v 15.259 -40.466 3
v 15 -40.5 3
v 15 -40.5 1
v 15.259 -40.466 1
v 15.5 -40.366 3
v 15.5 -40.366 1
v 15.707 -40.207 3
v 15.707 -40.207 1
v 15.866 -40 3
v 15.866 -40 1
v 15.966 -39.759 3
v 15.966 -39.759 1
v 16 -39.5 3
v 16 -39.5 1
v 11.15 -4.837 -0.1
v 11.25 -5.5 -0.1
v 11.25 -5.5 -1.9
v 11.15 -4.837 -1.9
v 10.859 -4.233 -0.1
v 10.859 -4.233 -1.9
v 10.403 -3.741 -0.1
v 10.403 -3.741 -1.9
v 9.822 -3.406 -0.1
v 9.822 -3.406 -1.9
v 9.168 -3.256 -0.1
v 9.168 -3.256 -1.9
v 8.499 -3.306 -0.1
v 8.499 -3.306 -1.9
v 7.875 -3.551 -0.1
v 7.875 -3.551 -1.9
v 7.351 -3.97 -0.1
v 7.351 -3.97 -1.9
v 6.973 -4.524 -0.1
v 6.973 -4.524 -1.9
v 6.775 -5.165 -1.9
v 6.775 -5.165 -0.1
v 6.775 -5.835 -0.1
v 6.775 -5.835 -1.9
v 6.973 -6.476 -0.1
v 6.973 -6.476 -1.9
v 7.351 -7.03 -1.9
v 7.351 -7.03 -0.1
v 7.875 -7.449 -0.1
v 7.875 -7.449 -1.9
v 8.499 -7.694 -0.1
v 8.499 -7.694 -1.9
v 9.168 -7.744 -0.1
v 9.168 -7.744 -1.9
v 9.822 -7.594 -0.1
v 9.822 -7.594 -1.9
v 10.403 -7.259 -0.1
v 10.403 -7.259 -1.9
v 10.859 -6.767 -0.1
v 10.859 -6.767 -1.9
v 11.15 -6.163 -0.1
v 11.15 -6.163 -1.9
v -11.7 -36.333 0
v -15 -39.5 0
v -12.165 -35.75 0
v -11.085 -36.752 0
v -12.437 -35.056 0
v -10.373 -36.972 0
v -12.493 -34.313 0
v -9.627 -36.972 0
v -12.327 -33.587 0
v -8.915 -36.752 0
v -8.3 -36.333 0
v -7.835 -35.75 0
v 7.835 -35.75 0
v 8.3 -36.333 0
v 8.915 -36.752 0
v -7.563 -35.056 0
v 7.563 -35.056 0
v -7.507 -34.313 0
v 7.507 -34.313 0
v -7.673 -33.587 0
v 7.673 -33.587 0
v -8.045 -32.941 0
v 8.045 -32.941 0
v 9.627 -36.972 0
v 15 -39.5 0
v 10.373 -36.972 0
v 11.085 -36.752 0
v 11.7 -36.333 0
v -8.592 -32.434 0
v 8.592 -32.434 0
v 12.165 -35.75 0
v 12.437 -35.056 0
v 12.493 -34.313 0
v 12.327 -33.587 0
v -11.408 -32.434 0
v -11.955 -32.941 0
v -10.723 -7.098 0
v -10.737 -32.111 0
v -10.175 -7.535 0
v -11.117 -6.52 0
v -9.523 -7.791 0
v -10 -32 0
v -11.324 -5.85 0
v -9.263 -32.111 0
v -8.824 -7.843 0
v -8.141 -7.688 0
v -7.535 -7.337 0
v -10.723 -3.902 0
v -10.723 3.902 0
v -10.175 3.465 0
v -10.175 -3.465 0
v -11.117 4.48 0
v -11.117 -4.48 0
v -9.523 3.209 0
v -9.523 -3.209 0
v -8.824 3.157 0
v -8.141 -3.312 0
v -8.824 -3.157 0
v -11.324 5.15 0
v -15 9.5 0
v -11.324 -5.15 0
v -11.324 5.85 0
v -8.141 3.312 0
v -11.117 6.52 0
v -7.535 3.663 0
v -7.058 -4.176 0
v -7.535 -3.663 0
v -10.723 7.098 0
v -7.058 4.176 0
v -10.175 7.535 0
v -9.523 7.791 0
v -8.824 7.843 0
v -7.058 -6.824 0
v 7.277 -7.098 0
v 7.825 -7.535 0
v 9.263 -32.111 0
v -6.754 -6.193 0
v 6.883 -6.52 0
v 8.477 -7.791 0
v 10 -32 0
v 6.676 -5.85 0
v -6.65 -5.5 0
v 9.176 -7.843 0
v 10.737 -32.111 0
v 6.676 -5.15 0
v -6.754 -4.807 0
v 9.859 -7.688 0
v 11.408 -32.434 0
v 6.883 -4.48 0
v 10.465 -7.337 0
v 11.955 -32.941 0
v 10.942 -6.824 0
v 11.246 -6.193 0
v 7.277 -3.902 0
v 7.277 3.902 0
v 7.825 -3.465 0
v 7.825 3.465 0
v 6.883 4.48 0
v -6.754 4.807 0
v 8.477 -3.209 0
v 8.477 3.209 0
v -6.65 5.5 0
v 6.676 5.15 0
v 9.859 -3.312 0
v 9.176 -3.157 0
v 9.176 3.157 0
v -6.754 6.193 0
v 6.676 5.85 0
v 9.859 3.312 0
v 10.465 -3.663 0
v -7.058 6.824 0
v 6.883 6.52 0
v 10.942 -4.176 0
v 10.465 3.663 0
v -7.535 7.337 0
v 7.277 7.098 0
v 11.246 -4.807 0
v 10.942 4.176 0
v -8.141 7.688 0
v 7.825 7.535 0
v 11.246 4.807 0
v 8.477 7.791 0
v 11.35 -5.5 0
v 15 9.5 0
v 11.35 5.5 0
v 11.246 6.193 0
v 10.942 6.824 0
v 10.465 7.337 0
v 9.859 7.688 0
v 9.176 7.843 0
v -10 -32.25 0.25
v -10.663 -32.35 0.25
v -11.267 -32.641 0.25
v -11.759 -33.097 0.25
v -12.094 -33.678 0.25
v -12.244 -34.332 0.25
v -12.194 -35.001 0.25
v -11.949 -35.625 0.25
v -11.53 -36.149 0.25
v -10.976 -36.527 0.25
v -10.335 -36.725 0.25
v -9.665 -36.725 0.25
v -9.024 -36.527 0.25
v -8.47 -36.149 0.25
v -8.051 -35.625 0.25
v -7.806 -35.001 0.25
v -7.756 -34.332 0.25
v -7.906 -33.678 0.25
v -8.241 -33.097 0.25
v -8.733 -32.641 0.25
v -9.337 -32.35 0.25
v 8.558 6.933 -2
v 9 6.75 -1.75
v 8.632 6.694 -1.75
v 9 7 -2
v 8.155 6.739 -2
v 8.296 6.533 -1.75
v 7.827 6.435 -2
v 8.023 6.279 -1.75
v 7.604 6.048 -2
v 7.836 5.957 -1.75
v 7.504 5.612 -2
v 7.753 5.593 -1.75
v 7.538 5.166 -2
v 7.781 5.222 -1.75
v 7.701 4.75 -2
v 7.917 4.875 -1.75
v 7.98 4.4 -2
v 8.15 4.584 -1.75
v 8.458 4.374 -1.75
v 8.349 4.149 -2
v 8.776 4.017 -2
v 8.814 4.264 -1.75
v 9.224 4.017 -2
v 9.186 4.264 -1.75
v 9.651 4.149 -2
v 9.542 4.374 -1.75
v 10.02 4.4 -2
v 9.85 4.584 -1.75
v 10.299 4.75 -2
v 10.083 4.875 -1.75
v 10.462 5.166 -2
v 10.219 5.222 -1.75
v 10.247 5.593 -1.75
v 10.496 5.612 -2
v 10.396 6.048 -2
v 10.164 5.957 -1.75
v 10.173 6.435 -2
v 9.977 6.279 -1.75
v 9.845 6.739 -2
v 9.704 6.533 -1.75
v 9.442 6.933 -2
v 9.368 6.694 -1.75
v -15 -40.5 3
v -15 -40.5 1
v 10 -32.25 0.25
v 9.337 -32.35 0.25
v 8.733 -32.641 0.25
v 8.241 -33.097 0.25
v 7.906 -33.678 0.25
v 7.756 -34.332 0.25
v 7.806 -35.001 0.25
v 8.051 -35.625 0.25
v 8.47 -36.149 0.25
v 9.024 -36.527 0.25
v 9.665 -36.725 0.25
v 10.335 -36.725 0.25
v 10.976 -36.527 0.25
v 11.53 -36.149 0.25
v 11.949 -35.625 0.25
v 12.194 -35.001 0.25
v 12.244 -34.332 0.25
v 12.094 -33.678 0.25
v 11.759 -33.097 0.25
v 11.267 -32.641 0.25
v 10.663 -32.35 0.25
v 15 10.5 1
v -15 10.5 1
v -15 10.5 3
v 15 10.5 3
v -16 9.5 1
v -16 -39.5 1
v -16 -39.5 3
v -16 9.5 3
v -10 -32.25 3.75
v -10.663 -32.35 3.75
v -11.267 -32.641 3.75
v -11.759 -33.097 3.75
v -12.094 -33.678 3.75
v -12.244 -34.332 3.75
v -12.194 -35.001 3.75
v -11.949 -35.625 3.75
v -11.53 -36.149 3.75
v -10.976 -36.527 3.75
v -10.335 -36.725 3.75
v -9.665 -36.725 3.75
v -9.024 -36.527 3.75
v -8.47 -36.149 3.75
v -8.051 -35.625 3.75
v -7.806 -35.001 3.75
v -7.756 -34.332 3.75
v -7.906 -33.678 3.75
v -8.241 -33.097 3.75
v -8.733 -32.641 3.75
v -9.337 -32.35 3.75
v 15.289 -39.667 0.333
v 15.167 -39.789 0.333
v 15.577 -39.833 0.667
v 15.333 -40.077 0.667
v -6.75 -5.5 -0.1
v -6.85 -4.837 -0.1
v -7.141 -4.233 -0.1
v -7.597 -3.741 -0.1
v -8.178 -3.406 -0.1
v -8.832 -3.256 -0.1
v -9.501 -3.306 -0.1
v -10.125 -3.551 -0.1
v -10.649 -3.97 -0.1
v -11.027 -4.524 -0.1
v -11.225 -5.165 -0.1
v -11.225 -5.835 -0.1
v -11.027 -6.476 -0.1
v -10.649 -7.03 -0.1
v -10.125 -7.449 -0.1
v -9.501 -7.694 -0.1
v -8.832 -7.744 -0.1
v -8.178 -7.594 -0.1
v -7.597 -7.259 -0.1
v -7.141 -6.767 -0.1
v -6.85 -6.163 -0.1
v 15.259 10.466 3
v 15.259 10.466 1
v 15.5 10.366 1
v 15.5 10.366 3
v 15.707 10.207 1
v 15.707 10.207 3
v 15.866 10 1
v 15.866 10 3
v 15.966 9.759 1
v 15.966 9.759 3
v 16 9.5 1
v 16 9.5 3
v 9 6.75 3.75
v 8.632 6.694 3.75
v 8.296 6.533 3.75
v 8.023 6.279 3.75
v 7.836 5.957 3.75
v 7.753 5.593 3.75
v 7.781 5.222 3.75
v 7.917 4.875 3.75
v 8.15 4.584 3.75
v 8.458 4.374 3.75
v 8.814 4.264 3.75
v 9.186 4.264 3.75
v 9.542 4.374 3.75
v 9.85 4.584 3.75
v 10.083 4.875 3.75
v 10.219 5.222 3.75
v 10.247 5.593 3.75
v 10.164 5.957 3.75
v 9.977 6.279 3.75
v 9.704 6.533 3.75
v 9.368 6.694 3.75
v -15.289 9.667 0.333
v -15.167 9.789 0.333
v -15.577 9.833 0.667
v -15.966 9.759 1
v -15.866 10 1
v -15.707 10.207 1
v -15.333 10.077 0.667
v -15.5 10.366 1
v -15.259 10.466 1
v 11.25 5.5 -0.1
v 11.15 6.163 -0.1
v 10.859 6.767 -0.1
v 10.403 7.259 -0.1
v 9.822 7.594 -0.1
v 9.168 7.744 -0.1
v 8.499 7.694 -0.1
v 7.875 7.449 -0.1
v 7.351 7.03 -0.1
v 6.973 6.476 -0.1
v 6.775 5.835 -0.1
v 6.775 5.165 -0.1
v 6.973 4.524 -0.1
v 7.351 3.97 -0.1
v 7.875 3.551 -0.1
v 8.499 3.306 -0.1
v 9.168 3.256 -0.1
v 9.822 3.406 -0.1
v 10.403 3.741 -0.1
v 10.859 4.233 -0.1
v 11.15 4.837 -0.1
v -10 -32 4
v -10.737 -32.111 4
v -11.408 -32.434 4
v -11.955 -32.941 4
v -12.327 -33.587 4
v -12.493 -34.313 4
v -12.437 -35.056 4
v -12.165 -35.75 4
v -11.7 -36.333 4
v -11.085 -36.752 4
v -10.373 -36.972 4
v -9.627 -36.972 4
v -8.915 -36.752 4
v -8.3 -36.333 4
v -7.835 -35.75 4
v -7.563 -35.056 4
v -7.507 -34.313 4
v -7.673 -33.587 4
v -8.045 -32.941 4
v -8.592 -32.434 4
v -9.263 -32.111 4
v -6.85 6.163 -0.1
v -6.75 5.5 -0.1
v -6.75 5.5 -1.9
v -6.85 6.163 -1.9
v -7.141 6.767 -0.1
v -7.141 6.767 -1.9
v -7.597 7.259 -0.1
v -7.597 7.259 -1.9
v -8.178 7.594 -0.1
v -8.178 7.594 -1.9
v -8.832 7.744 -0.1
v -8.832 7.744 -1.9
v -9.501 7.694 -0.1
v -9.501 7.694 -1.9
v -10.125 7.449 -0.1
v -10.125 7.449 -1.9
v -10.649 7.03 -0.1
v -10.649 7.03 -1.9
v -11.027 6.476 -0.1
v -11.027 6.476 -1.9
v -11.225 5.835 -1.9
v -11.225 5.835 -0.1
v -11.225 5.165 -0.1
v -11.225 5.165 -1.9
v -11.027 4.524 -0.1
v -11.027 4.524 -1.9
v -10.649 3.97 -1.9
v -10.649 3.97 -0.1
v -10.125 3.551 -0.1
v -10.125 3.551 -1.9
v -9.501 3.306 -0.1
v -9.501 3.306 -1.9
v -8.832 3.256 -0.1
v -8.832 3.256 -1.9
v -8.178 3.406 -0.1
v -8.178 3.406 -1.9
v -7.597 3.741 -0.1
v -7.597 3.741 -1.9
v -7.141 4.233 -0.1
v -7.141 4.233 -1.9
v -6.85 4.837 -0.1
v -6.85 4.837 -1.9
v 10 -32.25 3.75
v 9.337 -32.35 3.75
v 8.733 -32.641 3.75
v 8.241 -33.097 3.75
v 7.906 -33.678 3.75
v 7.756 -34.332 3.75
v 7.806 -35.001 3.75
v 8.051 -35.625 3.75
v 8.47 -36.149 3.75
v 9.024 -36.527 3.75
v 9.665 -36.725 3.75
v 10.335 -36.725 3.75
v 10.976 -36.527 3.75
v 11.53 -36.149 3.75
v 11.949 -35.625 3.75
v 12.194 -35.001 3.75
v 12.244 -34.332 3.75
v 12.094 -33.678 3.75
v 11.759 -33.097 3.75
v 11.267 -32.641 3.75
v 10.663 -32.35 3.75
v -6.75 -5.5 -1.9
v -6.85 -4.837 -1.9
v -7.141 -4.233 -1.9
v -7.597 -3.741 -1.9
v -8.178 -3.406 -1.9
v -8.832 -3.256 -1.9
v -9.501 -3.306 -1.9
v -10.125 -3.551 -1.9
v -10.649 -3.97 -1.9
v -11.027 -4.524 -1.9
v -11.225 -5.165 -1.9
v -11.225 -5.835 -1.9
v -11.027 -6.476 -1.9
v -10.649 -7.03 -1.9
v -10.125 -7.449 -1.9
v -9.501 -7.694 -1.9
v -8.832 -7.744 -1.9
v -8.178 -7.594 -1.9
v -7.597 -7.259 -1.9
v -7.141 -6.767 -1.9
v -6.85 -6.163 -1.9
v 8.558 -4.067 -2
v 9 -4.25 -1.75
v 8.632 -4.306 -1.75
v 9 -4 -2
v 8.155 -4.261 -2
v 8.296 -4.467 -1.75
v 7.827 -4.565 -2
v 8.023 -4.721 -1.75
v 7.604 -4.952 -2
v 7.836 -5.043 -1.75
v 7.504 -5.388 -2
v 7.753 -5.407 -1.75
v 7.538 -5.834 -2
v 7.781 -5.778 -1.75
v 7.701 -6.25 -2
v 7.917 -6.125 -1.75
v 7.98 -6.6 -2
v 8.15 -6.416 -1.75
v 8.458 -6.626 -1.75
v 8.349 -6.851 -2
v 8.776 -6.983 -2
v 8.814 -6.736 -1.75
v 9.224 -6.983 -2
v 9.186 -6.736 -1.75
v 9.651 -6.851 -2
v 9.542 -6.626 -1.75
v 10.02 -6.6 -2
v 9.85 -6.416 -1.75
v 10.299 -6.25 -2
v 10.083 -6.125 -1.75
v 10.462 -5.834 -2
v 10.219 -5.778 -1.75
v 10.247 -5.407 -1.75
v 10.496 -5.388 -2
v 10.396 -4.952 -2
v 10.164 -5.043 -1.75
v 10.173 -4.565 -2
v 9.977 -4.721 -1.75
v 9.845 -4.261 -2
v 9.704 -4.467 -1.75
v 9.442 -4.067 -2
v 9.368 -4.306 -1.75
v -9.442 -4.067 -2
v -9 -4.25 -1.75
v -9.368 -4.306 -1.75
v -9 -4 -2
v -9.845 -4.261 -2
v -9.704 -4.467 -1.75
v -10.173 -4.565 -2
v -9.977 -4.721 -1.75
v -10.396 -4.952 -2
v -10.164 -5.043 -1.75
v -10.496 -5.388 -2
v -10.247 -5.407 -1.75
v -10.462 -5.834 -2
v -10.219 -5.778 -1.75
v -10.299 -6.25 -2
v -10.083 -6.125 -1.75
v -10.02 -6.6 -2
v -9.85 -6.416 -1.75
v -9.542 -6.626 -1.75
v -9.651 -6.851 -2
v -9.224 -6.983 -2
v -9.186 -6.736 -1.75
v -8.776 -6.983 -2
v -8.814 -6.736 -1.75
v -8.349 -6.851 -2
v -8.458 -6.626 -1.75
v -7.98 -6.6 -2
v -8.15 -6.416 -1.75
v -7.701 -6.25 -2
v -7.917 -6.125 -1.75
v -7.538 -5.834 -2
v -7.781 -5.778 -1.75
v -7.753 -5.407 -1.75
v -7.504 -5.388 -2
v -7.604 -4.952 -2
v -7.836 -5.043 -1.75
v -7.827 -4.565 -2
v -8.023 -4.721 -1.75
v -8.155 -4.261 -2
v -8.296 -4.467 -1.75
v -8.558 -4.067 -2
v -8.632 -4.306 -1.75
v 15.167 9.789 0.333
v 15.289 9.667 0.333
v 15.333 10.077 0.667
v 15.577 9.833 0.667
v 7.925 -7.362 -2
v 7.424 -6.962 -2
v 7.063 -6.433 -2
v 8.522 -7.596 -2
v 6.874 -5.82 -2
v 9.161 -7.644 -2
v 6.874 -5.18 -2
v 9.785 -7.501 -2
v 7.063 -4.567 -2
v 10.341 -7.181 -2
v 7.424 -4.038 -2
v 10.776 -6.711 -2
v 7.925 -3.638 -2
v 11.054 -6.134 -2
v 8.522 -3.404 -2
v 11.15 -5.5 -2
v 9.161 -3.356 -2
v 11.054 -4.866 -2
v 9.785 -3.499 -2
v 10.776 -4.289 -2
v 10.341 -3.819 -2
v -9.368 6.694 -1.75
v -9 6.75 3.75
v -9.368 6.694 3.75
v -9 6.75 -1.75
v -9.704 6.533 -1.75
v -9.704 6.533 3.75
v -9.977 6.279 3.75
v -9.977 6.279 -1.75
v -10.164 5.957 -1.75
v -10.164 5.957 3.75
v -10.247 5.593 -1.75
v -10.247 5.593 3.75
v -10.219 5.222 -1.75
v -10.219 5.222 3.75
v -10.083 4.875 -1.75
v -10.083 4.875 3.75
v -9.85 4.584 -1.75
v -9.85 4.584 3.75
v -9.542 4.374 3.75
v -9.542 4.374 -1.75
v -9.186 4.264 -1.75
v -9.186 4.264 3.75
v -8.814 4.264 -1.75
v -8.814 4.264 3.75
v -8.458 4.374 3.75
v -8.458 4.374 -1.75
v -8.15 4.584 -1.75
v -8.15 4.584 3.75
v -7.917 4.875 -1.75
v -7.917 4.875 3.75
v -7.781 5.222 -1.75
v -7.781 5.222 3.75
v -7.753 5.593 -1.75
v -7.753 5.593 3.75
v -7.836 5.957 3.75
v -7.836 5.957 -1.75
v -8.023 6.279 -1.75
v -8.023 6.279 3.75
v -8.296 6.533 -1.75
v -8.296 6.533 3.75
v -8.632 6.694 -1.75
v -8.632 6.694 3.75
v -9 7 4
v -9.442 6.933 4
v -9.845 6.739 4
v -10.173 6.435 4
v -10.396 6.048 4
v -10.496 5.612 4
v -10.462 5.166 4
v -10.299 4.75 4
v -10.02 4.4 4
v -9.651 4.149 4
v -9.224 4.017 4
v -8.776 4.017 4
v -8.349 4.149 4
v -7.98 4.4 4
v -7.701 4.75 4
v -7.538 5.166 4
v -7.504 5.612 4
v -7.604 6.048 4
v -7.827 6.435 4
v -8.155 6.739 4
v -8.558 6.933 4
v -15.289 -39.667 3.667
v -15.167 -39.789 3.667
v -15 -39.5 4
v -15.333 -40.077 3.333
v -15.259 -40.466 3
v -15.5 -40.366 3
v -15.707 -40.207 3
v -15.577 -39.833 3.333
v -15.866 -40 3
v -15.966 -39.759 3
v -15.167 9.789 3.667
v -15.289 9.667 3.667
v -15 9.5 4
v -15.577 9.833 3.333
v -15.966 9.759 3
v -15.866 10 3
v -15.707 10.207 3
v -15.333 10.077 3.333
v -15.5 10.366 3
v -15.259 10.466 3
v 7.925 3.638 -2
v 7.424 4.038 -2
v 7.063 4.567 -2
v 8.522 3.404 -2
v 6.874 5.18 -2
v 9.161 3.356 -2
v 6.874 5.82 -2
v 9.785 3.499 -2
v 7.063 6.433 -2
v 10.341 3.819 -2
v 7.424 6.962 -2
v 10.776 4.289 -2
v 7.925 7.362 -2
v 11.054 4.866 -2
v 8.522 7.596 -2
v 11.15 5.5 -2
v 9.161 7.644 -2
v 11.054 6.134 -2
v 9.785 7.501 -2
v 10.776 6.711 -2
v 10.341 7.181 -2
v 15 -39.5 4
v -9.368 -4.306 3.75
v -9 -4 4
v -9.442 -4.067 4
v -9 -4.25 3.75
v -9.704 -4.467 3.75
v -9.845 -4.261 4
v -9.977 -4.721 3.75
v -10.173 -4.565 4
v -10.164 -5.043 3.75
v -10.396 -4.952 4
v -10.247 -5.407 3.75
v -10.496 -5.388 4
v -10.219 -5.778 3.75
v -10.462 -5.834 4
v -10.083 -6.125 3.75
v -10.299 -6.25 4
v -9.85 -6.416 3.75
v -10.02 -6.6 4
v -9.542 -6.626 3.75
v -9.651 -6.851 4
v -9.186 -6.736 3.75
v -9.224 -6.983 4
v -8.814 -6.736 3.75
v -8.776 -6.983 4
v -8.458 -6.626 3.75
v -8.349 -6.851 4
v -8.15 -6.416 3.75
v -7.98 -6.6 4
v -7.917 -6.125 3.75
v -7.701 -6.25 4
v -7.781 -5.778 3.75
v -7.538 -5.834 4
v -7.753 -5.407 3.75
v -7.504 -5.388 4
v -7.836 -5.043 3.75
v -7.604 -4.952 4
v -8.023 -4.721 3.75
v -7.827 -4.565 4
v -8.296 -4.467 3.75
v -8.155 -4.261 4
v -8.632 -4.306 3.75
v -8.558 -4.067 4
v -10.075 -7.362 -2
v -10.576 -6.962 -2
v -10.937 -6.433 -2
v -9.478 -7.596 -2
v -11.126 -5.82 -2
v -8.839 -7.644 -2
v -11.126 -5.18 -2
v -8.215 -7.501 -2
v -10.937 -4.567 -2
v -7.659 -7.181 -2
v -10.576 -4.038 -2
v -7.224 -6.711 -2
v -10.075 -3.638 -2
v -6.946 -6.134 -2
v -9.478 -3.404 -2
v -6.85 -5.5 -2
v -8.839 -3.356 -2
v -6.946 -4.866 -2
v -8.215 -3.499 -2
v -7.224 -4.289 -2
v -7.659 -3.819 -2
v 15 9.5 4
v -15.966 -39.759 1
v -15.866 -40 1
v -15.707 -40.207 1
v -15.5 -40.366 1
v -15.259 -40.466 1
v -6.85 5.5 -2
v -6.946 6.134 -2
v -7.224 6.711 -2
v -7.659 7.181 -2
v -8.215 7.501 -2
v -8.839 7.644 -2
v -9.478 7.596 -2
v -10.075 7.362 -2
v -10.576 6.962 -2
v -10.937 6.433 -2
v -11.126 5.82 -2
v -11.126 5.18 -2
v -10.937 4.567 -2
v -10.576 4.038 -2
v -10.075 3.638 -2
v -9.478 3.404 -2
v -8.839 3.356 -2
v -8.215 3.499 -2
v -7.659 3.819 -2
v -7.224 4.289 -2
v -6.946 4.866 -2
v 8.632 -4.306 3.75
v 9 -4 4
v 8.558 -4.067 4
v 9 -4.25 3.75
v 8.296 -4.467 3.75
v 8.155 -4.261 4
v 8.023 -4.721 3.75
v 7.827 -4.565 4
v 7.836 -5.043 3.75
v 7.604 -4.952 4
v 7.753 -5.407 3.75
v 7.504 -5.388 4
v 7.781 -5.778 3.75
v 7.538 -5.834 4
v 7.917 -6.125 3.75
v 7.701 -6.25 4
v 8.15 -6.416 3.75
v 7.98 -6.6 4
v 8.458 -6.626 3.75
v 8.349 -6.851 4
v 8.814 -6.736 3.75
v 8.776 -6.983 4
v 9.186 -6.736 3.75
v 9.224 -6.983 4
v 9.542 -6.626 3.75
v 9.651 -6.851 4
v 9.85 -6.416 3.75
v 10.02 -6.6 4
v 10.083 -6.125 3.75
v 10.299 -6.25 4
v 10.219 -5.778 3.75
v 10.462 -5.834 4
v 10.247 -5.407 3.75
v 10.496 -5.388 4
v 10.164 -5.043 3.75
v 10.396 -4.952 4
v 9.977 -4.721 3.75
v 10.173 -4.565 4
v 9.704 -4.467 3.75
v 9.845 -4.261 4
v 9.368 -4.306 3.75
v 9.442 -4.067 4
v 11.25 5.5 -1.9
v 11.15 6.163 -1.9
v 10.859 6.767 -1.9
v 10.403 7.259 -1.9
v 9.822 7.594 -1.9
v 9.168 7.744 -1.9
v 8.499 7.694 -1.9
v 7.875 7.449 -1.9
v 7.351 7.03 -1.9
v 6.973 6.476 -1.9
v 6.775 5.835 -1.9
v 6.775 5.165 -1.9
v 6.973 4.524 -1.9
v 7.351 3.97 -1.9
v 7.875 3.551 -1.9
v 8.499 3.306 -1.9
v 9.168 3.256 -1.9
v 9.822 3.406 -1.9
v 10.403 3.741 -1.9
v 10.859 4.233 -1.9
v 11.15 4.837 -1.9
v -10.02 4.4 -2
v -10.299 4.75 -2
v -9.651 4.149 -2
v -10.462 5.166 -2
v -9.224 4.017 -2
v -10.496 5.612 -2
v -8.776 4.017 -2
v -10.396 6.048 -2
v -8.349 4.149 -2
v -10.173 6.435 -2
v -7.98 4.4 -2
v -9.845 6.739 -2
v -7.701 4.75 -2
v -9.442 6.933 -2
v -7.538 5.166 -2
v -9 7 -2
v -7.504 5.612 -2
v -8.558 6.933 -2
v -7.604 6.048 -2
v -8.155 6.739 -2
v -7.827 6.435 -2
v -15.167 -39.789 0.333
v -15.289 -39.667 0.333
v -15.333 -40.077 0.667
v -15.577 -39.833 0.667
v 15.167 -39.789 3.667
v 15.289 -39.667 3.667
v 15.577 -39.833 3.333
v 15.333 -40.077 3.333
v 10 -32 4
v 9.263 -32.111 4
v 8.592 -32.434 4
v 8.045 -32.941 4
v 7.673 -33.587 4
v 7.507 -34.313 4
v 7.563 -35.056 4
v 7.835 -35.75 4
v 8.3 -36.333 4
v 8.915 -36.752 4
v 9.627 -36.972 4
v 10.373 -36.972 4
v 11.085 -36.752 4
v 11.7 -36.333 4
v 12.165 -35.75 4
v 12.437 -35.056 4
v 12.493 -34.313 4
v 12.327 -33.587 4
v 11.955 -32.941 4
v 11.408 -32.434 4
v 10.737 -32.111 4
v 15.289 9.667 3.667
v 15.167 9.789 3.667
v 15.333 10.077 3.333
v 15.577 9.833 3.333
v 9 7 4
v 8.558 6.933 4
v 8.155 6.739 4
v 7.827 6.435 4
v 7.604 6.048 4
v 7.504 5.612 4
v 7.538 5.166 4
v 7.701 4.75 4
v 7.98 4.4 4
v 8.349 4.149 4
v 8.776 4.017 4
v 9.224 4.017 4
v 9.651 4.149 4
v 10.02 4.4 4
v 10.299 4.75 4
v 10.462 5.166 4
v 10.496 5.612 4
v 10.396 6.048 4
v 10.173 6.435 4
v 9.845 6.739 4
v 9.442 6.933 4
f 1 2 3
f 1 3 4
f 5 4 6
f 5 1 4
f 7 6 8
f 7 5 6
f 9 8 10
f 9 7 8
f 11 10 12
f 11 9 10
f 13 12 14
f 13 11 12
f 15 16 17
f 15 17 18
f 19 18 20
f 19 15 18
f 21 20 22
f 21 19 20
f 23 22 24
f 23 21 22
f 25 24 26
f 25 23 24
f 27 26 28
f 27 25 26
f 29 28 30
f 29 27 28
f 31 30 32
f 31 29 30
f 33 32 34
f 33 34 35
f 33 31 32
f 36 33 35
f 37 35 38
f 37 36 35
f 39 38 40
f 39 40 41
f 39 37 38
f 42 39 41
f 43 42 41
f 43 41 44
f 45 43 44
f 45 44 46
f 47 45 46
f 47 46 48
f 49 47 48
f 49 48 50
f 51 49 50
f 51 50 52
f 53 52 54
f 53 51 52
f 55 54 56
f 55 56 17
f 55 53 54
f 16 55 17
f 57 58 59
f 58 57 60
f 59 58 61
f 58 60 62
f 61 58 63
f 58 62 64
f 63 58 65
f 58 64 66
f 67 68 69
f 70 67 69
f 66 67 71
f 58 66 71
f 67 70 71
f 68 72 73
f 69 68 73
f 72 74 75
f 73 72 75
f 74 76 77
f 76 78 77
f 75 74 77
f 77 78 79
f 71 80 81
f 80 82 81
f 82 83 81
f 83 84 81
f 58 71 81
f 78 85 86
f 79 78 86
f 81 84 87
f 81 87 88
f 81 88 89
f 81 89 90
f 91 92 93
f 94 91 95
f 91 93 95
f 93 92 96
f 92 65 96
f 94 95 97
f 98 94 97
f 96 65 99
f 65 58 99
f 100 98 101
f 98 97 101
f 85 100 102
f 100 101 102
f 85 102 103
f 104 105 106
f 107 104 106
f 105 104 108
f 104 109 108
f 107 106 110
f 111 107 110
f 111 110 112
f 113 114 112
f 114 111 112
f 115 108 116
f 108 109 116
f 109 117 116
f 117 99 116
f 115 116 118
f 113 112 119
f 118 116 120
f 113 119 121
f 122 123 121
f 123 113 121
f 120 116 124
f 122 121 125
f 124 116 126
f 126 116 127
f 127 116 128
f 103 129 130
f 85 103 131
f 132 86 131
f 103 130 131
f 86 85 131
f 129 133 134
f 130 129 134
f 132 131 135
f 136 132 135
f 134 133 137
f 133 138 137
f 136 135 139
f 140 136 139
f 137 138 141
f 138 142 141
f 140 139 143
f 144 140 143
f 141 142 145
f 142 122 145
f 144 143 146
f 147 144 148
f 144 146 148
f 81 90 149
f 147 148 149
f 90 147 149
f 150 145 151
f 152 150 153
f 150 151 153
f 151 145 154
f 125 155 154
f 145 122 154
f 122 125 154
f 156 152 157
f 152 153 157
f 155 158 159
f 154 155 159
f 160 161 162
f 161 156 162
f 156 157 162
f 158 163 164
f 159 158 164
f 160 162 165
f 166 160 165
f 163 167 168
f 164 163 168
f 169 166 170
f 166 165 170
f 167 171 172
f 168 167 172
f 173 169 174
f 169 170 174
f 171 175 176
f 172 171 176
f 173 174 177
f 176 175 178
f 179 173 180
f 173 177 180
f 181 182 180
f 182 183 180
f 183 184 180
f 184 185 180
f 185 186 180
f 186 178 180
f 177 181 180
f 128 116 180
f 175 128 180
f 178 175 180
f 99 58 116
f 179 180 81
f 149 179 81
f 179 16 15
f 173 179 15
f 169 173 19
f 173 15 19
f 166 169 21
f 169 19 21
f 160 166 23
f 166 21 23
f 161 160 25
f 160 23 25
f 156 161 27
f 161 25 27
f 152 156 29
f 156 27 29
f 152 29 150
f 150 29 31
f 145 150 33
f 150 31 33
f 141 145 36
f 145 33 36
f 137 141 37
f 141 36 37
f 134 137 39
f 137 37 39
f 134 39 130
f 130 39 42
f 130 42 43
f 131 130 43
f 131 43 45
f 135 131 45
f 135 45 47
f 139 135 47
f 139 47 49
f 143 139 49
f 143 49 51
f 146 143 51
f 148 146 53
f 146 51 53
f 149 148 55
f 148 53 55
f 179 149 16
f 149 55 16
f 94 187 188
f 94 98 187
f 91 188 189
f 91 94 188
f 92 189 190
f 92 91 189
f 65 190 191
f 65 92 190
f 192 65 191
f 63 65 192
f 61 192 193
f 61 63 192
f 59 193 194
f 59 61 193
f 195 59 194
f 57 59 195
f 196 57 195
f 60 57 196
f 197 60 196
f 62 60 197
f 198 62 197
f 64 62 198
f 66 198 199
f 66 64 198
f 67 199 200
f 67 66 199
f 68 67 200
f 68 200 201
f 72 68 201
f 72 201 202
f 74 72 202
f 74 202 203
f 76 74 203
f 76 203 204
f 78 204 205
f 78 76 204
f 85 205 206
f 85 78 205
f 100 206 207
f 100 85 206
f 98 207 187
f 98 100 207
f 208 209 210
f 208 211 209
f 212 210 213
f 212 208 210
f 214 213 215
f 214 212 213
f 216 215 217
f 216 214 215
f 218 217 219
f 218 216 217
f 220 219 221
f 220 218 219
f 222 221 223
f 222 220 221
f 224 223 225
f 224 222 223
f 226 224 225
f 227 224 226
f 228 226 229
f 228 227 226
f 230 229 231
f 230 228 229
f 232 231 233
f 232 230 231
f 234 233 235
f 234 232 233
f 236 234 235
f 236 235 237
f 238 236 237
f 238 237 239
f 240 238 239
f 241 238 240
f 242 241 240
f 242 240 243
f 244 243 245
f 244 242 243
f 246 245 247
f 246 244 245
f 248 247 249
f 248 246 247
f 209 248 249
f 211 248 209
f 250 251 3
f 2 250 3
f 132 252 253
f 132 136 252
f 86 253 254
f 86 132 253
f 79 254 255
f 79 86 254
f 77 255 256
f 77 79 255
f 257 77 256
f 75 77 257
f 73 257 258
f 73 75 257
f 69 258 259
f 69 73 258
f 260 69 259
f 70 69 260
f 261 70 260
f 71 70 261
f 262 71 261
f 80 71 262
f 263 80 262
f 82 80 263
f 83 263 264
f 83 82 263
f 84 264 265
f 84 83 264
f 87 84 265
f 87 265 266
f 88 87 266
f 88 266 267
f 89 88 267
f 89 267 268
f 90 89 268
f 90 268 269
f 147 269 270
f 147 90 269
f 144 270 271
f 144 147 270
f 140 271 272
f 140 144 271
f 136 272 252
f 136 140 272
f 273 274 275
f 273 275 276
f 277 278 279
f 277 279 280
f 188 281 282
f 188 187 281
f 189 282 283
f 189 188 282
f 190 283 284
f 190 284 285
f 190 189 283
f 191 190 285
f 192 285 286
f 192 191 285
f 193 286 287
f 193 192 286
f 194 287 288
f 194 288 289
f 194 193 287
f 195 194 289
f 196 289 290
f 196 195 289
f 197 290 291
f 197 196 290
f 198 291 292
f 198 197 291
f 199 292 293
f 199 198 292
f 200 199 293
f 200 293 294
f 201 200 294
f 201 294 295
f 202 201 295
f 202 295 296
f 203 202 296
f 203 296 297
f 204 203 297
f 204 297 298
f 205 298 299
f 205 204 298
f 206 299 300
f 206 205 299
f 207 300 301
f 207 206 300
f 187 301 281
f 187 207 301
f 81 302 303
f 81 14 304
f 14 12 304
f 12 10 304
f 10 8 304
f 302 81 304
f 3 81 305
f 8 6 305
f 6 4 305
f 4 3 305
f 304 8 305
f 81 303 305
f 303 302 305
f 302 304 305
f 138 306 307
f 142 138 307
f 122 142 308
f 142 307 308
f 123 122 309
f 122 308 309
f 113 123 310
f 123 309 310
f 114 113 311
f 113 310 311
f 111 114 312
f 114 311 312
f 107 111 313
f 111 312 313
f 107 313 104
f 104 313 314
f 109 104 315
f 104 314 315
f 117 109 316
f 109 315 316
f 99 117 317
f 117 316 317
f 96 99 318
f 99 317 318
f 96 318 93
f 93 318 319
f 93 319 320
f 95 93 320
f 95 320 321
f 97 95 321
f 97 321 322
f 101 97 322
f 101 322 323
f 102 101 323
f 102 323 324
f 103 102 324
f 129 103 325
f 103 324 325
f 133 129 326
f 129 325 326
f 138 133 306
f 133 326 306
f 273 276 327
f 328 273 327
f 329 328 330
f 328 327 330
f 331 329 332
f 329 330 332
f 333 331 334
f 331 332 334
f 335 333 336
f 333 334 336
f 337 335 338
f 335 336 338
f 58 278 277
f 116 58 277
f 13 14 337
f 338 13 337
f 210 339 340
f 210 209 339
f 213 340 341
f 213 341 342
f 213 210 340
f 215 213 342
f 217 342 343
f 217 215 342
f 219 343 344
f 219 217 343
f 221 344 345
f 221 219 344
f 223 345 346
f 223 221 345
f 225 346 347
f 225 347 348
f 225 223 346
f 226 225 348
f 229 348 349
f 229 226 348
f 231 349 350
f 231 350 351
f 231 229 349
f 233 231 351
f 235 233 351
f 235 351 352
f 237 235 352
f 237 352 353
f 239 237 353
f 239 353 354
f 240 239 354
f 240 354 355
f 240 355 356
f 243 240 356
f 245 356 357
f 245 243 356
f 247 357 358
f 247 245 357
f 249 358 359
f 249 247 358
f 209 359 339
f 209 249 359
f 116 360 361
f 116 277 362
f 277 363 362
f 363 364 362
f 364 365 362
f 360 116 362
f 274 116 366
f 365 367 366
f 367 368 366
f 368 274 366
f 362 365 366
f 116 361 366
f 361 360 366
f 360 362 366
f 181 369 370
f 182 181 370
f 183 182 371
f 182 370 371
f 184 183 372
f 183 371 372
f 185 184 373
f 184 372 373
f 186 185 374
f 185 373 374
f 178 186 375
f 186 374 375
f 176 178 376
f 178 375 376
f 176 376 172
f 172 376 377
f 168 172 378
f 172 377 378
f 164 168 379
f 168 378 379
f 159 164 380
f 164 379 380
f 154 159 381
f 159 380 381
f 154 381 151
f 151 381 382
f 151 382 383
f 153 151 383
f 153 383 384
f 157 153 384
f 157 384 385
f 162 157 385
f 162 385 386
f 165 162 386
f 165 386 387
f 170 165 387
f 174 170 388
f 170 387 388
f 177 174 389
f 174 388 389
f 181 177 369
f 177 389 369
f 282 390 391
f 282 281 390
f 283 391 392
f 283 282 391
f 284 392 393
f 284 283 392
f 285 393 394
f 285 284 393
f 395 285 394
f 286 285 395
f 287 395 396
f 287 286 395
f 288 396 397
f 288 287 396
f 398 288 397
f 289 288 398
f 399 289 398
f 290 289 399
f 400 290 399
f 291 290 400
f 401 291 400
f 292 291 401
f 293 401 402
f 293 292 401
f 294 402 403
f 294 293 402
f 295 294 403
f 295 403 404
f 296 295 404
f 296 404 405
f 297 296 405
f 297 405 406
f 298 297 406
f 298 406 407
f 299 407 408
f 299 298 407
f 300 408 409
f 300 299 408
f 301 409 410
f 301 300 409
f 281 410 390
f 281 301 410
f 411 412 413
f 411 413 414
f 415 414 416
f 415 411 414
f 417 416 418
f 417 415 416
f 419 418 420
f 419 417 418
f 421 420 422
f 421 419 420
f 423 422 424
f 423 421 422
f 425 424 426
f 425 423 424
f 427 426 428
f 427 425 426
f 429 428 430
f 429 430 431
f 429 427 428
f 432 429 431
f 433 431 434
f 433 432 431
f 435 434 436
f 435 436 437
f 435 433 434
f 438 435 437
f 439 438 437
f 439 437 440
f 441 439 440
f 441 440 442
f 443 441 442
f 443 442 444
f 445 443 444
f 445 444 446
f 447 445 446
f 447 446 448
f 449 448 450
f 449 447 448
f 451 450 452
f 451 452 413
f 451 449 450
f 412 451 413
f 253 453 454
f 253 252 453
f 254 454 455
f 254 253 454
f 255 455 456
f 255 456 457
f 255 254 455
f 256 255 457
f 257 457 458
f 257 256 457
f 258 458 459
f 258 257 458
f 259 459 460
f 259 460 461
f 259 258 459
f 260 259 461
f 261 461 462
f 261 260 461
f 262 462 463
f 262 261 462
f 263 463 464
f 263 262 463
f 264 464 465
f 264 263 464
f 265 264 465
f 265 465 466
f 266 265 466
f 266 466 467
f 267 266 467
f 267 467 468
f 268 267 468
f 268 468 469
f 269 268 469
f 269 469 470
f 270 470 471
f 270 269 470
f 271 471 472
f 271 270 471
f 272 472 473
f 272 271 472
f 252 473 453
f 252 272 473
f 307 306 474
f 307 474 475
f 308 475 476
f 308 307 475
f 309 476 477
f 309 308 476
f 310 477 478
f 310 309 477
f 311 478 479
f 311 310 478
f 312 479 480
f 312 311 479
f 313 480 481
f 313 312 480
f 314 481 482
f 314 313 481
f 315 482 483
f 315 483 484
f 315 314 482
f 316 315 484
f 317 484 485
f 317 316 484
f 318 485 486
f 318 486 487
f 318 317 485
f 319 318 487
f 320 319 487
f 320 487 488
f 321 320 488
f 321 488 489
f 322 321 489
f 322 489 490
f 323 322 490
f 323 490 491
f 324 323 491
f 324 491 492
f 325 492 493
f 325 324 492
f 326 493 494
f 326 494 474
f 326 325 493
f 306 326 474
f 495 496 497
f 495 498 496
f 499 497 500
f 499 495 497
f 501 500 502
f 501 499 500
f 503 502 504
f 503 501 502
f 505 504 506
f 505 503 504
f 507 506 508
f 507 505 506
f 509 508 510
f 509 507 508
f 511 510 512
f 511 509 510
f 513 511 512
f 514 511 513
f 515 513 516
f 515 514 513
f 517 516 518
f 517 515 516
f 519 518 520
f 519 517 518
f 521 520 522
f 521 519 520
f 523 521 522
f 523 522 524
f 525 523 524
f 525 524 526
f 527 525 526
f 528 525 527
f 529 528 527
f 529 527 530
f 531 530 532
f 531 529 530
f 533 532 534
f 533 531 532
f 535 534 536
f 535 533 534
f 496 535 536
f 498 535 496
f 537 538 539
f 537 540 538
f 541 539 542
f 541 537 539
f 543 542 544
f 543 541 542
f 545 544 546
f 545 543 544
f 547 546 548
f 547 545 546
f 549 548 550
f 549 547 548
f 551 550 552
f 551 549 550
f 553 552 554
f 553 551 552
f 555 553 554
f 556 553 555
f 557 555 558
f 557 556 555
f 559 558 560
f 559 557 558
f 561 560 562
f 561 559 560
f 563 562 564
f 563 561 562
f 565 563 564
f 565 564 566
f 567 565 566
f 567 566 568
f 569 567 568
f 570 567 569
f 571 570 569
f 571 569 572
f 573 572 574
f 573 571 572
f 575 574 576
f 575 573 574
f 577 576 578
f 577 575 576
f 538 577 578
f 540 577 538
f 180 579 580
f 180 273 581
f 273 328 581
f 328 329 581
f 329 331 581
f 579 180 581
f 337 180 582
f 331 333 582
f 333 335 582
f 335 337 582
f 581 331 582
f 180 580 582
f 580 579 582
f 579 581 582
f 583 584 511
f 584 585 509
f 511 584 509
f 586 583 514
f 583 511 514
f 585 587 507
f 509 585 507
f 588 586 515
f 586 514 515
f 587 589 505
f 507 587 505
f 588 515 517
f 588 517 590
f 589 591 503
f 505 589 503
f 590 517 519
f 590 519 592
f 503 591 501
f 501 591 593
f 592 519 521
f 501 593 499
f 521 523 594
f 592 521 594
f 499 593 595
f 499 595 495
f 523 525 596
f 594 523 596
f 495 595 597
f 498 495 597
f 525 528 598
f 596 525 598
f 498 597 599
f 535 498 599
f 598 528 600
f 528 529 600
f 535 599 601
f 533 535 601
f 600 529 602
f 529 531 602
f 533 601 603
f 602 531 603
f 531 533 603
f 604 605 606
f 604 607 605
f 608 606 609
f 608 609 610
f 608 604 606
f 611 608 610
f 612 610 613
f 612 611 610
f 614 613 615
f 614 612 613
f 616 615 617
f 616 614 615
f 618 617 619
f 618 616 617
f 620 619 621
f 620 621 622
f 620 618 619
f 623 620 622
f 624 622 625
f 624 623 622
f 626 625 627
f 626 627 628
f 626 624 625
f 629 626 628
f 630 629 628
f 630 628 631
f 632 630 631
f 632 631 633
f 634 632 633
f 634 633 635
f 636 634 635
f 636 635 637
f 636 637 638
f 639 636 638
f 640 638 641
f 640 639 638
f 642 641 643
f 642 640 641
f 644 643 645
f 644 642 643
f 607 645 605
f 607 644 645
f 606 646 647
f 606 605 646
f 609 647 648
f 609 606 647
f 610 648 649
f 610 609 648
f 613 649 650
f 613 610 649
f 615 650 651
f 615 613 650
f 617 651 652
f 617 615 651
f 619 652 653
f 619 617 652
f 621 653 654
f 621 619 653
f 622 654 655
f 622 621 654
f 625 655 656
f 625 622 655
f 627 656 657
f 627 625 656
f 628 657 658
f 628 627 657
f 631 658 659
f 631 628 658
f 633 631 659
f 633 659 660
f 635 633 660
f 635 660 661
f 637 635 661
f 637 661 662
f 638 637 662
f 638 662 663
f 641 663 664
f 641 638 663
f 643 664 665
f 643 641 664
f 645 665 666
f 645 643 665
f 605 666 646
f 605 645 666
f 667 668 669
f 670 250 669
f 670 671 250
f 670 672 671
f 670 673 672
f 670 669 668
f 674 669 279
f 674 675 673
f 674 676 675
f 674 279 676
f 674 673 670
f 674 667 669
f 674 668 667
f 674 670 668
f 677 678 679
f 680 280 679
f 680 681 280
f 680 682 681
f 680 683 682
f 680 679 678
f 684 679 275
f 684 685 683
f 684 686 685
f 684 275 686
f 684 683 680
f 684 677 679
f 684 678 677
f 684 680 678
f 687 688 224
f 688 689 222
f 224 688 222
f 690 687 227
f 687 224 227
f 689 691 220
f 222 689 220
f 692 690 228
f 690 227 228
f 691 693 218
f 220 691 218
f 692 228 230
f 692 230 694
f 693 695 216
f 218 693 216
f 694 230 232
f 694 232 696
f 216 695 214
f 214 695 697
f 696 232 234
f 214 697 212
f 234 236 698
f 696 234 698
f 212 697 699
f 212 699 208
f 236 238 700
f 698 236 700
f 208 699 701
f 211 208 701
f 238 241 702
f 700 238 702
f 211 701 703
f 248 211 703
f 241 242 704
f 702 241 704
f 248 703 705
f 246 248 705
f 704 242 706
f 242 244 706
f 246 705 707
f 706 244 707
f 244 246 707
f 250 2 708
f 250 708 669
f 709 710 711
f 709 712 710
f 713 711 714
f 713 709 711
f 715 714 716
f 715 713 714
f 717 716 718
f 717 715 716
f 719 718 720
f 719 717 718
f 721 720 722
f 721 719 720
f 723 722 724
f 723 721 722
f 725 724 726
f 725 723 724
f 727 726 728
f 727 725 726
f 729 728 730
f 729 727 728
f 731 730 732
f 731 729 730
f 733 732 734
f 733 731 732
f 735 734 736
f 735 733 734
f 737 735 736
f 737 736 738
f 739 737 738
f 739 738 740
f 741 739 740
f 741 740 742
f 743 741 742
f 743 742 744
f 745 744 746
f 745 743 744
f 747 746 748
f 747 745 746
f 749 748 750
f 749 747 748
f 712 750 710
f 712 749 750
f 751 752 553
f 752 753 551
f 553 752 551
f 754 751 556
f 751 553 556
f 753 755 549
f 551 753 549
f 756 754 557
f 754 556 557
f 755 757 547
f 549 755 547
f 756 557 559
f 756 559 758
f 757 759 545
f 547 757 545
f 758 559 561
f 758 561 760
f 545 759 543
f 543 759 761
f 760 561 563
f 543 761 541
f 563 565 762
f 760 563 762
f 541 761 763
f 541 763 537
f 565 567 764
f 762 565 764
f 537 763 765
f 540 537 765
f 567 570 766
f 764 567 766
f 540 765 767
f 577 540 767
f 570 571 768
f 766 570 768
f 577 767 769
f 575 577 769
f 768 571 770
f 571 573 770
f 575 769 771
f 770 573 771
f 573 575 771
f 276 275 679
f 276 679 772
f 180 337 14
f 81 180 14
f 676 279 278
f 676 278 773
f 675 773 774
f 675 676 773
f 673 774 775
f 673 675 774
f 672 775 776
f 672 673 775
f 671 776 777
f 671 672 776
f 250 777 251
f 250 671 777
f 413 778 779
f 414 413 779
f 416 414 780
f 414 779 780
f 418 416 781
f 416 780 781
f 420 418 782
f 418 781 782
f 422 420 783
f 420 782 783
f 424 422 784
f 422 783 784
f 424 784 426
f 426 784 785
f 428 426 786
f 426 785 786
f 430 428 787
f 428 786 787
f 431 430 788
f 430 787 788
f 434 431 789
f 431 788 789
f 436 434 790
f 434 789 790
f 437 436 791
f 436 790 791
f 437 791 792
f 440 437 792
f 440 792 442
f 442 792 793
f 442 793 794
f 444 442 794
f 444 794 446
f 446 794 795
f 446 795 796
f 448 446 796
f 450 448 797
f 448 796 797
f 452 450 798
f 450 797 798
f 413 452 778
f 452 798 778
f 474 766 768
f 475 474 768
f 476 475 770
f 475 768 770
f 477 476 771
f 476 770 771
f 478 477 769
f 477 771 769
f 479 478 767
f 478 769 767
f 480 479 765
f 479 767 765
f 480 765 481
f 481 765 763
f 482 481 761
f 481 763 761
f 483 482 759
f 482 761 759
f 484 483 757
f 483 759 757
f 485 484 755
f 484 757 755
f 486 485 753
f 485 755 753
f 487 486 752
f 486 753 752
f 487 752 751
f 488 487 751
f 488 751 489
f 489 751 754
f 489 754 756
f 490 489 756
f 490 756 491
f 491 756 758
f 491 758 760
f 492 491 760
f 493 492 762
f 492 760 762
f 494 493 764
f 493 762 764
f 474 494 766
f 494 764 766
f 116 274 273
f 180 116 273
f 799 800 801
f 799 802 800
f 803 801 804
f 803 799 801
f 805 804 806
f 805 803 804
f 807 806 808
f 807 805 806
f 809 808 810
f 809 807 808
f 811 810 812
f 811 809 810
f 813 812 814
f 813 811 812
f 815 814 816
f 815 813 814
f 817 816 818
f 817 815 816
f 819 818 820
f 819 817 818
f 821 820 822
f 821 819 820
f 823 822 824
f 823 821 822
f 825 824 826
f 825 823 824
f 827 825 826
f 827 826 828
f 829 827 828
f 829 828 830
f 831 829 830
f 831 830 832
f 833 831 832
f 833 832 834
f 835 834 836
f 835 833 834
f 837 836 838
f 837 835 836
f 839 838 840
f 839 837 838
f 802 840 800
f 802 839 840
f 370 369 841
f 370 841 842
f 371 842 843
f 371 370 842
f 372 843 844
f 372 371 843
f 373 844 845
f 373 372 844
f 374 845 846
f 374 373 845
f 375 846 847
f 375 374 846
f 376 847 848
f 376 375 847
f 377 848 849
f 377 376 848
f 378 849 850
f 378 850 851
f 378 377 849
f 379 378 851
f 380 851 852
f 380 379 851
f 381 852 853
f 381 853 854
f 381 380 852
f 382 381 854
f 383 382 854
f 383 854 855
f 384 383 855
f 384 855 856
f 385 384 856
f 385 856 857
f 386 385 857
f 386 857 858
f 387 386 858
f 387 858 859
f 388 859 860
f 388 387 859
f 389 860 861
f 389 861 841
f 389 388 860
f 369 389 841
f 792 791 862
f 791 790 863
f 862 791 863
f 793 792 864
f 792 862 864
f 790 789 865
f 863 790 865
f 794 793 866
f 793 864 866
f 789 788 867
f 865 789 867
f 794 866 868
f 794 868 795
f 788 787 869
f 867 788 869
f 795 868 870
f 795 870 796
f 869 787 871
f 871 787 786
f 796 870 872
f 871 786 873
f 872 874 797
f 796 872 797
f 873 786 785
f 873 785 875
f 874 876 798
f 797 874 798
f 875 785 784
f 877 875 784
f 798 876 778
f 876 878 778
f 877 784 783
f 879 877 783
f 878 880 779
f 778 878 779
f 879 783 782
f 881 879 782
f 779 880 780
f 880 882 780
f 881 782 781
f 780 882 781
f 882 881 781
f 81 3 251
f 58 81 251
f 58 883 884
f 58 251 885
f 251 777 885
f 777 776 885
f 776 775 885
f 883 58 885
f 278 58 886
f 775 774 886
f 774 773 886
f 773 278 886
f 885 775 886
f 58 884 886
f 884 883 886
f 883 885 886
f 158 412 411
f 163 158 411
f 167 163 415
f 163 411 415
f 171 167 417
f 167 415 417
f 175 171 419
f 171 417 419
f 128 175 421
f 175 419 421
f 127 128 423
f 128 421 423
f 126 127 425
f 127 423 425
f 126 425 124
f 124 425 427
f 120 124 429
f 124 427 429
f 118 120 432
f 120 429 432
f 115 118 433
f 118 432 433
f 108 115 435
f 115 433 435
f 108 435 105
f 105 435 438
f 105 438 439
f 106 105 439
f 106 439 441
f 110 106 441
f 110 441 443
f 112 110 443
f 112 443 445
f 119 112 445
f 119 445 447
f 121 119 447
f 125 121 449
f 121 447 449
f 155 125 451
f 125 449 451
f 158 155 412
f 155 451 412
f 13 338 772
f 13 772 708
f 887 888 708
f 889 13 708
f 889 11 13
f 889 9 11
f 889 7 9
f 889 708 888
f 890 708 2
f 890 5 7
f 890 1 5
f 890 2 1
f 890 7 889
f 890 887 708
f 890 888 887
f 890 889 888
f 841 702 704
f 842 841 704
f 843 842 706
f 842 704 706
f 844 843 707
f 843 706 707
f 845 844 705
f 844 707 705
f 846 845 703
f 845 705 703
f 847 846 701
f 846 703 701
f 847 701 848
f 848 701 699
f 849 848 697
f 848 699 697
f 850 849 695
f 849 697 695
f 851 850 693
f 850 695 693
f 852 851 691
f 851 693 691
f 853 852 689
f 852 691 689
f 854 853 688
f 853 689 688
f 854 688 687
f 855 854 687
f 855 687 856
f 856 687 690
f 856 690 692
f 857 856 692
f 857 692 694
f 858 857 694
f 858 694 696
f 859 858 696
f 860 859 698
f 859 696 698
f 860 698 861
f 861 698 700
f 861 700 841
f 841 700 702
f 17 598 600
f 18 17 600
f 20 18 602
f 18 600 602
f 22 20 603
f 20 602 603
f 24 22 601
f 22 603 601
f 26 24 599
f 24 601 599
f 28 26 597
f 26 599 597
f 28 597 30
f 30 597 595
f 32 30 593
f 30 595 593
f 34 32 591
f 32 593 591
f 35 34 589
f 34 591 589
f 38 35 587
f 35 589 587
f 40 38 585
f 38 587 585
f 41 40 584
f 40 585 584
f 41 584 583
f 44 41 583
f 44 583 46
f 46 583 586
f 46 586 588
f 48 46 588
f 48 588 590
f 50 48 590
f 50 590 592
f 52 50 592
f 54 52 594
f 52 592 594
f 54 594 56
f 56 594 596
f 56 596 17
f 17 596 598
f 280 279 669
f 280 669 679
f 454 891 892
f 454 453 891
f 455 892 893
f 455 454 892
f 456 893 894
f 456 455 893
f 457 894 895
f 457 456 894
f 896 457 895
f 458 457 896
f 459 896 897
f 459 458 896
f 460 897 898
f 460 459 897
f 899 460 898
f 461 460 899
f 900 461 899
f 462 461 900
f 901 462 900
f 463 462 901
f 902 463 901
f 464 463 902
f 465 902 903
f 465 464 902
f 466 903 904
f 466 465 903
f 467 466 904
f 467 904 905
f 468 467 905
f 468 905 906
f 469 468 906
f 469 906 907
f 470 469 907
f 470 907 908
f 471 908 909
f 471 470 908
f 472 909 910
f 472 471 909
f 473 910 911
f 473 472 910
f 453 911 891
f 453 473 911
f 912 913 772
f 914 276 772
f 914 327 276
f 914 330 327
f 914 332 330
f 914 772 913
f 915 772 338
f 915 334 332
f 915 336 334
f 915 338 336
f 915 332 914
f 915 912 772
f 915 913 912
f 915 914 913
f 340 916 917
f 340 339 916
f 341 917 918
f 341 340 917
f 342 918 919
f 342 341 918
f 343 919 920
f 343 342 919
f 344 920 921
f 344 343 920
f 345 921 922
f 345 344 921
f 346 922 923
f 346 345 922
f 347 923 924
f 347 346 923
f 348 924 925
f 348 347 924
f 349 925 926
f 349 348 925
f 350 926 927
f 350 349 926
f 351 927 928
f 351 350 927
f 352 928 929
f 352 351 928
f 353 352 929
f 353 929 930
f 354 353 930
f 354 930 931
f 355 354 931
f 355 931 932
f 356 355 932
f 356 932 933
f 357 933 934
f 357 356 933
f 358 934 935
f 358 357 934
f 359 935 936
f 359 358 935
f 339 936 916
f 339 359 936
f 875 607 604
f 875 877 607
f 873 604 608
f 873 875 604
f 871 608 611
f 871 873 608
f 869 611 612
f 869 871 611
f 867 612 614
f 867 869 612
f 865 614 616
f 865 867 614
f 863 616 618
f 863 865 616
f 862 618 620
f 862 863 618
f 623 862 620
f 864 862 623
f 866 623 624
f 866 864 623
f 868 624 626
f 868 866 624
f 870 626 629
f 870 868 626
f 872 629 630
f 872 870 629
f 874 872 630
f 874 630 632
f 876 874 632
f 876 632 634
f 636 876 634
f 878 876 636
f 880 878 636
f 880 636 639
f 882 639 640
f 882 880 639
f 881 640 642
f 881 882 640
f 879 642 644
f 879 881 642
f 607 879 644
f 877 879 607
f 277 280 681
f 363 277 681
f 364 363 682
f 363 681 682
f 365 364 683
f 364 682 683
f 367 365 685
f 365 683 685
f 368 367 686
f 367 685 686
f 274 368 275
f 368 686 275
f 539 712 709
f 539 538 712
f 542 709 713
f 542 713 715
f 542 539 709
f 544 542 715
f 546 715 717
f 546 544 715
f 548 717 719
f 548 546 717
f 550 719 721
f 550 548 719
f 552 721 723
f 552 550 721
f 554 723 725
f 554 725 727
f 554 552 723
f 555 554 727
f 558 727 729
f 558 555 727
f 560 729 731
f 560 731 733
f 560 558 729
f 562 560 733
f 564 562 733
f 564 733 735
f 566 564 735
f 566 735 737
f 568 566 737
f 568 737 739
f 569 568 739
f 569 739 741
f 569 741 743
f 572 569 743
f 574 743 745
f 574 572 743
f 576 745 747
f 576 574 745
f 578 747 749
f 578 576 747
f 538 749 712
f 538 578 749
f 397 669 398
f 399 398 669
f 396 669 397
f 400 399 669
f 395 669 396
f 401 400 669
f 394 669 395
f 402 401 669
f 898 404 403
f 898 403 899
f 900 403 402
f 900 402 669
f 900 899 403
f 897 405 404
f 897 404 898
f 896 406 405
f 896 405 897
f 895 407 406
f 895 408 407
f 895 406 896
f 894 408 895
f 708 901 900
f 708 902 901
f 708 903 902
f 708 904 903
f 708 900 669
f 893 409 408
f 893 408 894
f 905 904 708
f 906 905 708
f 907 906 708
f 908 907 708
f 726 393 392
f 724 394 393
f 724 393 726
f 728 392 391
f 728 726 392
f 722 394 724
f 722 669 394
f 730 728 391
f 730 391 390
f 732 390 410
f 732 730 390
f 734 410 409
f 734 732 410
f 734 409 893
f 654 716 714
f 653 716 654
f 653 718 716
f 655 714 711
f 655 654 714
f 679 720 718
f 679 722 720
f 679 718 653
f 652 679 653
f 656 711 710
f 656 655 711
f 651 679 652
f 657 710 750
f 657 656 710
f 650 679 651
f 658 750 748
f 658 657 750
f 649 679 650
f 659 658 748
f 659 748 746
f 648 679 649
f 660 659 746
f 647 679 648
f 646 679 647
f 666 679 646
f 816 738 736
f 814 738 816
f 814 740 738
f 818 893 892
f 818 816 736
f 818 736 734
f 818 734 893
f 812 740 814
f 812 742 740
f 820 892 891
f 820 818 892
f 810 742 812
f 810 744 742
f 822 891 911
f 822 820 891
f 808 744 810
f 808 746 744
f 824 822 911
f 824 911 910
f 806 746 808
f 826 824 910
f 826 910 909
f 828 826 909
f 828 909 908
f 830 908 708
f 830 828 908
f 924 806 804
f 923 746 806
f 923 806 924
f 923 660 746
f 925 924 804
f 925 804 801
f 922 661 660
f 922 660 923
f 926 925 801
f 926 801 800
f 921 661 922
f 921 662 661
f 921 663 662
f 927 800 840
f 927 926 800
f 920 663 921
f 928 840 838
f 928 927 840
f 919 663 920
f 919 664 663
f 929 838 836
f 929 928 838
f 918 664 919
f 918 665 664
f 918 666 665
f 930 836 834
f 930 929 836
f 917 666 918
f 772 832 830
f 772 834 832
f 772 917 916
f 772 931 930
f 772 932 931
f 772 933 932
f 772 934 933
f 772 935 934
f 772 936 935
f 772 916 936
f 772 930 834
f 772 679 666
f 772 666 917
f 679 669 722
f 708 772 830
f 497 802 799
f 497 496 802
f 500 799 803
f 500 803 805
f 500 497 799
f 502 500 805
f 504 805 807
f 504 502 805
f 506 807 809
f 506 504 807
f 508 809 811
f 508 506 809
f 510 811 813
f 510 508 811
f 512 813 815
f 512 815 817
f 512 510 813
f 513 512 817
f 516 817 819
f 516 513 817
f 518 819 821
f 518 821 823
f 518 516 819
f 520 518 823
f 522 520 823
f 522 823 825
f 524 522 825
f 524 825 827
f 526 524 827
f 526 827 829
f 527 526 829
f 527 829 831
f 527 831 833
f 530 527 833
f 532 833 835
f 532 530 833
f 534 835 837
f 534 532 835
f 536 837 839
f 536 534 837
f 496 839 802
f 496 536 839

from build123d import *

# Parameters (mm, degrees)
SKETCH1_W                      = 32
SKETCH1_H                      = 51
BOSS_EXTRUDE1_DEPTH            = 4
SKETCH1_3_R                    = 2.25
BOSS_EXTRUDE2_DEPTH            = 2
F_2_5MM_DOWEL_HOLE1_AT_2_COUNT = 2
F_2_5MM_DOWEL_HOLE1_AT_2_PITCH = 11
F_2_5MM_DOWEL_HOLE1_AT_3_COUNT = 2
F_2_5MM_DOWEL_HOLE1_AT_3_PITCH = 21.09502311
F_2_5MM_DOWEL_HOLE1_AT_4_COUNT = 2
F_2_5MM_DOWEL_HOLE1_AT_4_PITCH = 18
M4_CLEARANCE_HOLE1_AT_2_COUNT  = 2
M4_CLEARANCE_HOLE1_AT_2_PITCH  = 20
FILLET1_R                      = 1
CHAMFER1_SIZE                  = 1
CHAMFER2_SIZE                  = 0.1


with BuildPart() as part:
    # Sketch1 → Boss-Extrude1 (new body)
    with BuildSketch(Plane.XY):
        with Locations((0, -15)):
            Rectangle(SKETCH1_W, SKETCH1_H)
    extrude(amount=BOSS_EXTRUDE1_DEPTH)

    # Sketch1<3> → Boss-Extrude2 (add)
    with BuildSketch(Plane.XY):
        with Locations((-9, 5.5)):
            Circle(SKETCH1_3_R)
        with Locations((-9, -5.5)):
            Circle(SKETCH1_3_R)
        with Locations((9, -5.5)):
            Circle(SKETCH1_3_R)
        with Locations((9, 5.5)):
            Circle(SKETCH1_3_R)
    extrude(amount=-BOSS_EXTRUDE2_DEPTH)

    # Sketch5 → Ø2.5mm Dowel Hole1 (revolve, cut)
    with BuildSketch(Plane(origin=(-9, 5.5, -2), x_dir=(0, 1, 0), z_dir=(1, 0, 0))):
        Polygon((0, 0), (0, 6), (1.5, 6), (1.25, 5.75), (1.25, 0.25), (1.5, 0), align=None)
    f_2_5mm_dowel_hole1 = revolve(axis=Axis((-9, 5.5, -8.35), (0, 0, 1)), mode=Mode.SUBTRACT)

    # Ø2.5mm Dowel Hole1 at 2: Ø2.5mm Dowel Hole1 ×2
    with Locations(*[(0, -i * F_2_5MM_DOWEL_HOLE1_AT_2_PITCH, 0) for i in range(1, F_2_5MM_DOWEL_HOLE1_AT_2_COUNT)]):
        add(f_2_5mm_dowel_hole1, mode=Mode.SUBTRACT)

    # Ø2.5mm Dowel Hole1 at 3: Ø2.5mm Dowel Hole1 ×2
    with Locations(*[Vector(0.8532818336519591, -0.521450009453975, 0) * (i * F_2_5MM_DOWEL_HOLE1_AT_3_PITCH) for i in range(1, F_2_5MM_DOWEL_HOLE1_AT_3_COUNT)]):
        add(f_2_5mm_dowel_hole1, mode=Mode.SUBTRACT)

    # Ø2.5mm Dowel Hole1 at 4: Ø2.5mm Dowel Hole1 ×2
    with Locations(*[(i * F_2_5MM_DOWEL_HOLE1_AT_4_PITCH, 0, 0) for i in range(1, F_2_5MM_DOWEL_HOLE1_AT_4_COUNT)]):
        add(f_2_5mm_dowel_hole1, mode=Mode.SUBTRACT)

    # Sketch8 → M4 Clearance Hole1 (revolve, cut)
    with BuildSketch(Plane(origin=(-10, -34.5, 0), x_dir=(0, 1, 0), z_dir=(1, 0, 0))):
        Polygon((0, 0), (0, 4), (2.5, 4), (2.25, 3.75), (2.25, 0.25), (2.5, 0), align=None)
    m4_clearance_hole1 = revolve(axis=Axis((-10, -34.5, -6.35), (0, 0, 1)), mode=Mode.SUBTRACT)

    # M4 Clearance Hole1 at 2: M4 Clearance Hole1 ×2
    with Locations(*[(i * M4_CLEARANCE_HOLE1_AT_2_PITCH, 0, 0) for i in range(1, M4_CLEARANCE_HOLE1_AT_2_COUNT)]):
        add(m4_clearance_hole1, mode=Mode.SUBTRACT)

    # Fillet1
    fillet1_edges = [part.edges().sort_by_distance(p)[0] for p in [
        (16, 10.5, 2),
        (16, -40.5, 2),
        (-16, -40.5, 2),
        (-16, 10.5, 2),
    ]]
    fillet(fillet1_edges, radius=FILLET1_R)

    # Chamfer1
    chamfer1_edges = [part.edges().sort_by_distance(p)[0] for p in [
        (0, -40.5, 4),
        (-15.707106781, -40.207106781, 4),
        (15.707106781, -40.207106781, 4),
        (-16, -15, 4),
        (16, -15, 4),
        (-15.707106781, 10.207106781, 4),
        (15.707106781, 10.207106781, 4),
        (0, 10.5, 4),
        (0, -40.5, 0),
        (-15.707106781, -40.207106781, 0),
        (15.707106781, -40.207106781, 0),
        (-16, -15, 0),
        (16, -15, 0),
        (-15.707106781, 10.207106781, 0),
        (15.707106781, 10.207106781, 0),
        (0, 10.5, 0),
    ]]
    chamfer(chamfer1_edges, length=CHAMFER1_SIZE)

    # Chamfer2
    chamfer2_edges = [part.edges().sort_by_distance(p)[0] for p in [
        (6.75, -5.5, 0),
        (6.75, -5.5, -2),
        (6.75, 5.5, 0),
        (6.75, 5.5, -2),
        (-11.25, -5.5, 0),
        (-11.25, -5.5, -2),
        (-11.25, 5.5, 0),
        (-11.25, 5.5, -2),
    ]]
    chamfer(chamfer2_edges, length=CHAMFER2_SIZE)


solid = part.part
